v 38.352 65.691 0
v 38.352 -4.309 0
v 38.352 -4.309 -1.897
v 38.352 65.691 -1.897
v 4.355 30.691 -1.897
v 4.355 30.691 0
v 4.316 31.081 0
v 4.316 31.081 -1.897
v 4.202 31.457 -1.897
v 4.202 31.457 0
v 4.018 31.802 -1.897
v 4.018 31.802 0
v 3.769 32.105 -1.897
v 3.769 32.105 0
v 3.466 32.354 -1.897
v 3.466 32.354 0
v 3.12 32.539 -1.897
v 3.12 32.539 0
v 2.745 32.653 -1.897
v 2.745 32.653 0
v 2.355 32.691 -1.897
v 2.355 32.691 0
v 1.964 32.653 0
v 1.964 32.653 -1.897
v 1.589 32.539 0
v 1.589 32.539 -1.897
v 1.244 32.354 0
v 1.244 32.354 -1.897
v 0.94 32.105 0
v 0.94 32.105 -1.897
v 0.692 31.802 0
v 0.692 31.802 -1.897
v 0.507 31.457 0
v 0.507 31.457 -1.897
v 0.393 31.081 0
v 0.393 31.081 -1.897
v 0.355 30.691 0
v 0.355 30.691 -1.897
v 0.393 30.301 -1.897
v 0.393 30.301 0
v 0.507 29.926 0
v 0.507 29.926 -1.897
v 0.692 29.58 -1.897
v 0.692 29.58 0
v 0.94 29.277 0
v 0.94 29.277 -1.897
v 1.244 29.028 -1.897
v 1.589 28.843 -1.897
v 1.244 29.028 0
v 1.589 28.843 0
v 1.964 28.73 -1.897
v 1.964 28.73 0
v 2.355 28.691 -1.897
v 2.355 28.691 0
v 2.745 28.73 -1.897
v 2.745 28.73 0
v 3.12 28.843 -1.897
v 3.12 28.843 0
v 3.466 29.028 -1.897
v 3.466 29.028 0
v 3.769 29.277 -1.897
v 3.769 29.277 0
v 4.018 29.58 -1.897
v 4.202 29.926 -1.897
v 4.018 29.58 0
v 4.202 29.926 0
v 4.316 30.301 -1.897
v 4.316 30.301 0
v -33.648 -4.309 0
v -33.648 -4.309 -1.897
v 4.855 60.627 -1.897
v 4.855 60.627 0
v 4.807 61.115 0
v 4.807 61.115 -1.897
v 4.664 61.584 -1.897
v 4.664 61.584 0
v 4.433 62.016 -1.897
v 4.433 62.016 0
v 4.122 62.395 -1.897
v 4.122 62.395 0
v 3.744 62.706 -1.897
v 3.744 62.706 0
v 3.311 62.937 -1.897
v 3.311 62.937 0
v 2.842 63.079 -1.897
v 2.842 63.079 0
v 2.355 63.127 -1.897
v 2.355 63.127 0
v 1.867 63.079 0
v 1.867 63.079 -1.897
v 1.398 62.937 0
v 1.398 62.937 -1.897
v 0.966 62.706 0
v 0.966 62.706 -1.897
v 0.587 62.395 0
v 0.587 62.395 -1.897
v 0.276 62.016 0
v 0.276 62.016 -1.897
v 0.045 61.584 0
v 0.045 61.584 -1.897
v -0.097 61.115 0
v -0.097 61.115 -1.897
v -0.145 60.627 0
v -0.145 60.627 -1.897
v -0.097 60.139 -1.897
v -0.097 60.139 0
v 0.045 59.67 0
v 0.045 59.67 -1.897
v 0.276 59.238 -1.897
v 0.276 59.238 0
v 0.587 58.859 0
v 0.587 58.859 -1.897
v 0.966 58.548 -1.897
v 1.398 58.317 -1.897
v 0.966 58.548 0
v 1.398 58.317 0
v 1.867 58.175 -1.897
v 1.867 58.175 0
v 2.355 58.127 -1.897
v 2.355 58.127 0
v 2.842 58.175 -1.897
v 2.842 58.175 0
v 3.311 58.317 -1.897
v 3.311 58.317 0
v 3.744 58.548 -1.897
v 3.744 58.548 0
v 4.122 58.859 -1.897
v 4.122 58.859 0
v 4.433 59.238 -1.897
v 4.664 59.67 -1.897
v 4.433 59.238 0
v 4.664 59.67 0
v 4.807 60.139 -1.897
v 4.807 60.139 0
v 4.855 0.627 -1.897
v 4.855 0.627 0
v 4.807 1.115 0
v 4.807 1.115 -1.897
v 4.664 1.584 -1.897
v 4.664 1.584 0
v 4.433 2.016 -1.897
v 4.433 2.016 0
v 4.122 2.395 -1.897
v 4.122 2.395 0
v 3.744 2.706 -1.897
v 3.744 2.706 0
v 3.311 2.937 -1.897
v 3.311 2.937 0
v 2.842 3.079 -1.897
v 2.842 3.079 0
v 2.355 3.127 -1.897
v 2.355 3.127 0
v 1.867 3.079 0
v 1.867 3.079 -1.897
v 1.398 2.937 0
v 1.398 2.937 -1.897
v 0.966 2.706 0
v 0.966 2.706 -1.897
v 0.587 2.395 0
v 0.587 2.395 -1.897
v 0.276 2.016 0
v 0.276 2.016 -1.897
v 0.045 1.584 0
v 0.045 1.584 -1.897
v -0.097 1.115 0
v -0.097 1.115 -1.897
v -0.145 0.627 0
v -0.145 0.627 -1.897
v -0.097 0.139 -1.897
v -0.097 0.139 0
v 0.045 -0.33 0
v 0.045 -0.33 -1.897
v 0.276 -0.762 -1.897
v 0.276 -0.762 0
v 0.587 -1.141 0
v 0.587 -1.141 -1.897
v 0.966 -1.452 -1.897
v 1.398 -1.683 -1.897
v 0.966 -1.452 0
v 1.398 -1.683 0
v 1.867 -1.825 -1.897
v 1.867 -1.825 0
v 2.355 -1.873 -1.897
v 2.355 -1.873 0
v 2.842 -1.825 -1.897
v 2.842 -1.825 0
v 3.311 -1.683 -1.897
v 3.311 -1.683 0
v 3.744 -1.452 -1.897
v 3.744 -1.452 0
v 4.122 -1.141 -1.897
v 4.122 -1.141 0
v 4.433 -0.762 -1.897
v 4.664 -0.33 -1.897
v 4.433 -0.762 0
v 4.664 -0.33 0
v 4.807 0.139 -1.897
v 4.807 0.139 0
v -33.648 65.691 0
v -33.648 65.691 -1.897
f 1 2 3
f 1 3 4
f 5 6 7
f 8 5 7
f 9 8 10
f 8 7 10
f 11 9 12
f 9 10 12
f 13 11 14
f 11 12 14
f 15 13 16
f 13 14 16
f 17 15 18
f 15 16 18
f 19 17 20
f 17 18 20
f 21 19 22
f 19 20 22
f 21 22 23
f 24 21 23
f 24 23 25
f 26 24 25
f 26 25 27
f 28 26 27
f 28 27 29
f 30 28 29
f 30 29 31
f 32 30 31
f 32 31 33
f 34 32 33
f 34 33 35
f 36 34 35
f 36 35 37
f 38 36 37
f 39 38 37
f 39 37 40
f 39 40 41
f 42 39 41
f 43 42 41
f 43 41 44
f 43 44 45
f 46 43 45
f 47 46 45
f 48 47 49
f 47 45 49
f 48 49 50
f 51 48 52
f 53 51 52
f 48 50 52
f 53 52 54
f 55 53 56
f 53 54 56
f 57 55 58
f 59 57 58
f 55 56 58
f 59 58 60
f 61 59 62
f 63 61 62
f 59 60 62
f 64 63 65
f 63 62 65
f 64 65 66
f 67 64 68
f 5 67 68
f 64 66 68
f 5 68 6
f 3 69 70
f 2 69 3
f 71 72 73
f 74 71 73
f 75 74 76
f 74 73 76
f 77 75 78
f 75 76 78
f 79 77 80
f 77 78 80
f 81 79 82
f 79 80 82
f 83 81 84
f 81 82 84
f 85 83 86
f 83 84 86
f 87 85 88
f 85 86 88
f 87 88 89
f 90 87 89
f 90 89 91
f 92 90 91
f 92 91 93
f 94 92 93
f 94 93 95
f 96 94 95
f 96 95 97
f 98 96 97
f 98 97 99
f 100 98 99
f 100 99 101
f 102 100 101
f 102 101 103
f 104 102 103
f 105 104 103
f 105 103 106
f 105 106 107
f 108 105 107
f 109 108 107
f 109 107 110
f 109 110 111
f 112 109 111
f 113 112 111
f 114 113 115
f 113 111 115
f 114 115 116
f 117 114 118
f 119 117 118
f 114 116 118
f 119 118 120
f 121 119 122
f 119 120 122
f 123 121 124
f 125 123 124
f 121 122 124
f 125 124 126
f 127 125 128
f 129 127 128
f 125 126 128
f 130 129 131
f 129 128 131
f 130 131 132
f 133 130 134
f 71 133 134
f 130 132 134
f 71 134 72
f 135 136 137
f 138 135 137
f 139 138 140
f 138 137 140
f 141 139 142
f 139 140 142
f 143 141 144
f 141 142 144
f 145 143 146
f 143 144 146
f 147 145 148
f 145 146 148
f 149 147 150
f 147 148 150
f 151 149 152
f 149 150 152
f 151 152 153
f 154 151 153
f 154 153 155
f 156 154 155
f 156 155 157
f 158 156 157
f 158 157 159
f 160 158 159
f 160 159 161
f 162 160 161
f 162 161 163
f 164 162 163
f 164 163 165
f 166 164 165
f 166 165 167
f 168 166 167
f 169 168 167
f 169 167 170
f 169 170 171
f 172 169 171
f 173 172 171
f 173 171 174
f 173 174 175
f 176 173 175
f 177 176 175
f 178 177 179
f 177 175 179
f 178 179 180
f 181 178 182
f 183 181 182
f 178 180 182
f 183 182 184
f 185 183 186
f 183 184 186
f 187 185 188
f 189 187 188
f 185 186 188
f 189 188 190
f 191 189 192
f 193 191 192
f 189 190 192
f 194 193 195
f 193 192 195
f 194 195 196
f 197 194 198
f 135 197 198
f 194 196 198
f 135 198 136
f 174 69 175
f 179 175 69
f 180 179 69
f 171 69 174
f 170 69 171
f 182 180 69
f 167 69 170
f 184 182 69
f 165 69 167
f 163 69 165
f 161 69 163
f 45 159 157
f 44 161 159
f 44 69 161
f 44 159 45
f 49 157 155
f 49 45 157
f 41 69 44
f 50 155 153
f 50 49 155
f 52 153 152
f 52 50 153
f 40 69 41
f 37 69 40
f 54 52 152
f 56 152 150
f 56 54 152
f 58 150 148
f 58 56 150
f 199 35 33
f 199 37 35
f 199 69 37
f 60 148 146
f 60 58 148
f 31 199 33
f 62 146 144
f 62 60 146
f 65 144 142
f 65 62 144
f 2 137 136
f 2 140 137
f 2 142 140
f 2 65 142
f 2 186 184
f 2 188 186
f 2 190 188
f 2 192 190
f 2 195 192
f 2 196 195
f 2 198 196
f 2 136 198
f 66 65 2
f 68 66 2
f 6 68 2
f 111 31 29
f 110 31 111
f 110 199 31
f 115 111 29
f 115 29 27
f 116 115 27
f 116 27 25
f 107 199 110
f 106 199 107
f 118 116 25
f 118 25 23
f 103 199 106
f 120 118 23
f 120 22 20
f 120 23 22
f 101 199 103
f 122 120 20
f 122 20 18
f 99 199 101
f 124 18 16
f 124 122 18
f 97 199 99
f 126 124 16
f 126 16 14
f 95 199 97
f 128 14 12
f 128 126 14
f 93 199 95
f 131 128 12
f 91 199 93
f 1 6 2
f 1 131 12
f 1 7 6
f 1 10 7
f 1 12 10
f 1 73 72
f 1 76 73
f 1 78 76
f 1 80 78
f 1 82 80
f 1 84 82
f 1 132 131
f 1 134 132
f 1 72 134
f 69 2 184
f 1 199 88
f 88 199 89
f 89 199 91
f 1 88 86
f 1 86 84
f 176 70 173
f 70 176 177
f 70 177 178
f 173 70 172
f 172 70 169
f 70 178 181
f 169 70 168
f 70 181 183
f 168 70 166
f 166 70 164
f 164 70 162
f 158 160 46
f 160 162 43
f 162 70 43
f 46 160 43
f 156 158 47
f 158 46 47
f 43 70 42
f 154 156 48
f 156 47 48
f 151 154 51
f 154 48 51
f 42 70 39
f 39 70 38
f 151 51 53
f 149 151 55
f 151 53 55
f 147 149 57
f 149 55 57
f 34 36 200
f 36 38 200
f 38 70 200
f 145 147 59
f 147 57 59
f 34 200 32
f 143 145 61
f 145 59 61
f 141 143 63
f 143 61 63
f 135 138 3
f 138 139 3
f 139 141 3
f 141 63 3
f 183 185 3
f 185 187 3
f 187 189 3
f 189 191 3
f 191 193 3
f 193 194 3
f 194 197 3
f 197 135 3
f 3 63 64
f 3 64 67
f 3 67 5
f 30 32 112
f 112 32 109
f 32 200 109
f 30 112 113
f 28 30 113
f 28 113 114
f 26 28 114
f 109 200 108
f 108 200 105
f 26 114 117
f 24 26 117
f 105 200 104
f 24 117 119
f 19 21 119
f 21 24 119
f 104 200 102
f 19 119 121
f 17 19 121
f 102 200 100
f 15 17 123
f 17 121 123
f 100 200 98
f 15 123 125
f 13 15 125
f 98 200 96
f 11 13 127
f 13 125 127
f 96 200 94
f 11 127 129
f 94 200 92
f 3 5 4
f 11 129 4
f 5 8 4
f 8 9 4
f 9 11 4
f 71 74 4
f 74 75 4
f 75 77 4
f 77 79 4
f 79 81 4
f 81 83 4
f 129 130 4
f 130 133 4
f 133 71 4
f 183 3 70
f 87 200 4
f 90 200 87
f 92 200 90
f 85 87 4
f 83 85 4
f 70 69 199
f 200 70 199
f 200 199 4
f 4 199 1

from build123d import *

# Parameters (mm, degrees)
SKETCH1_W          = 72
SKETCH1_H          = 70
BASE_FLANGE1_DEPTH = 1.89738
SKETCH6_R          = 2.5
SKETCH6_R_2        = 2
CUT_EXTRUDE1_DEPTH = 2


# Sheet-metal steps are written as plain solids
with BuildPart() as part:
    # Sketch1 → Base-Flange1 (new body)
    with BuildSketch(Plane.XY):
        with Locations((2.352272727, 30.691243667)):
            Rectangle(SKETCH1_W, SKETCH1_H)
    extrude(amount=-BASE_FLANGE1_DEPTH)

    # Sketch6 → Cut-Extrude1 (cut)
    with BuildSketch(Plane.XY):
        with Locations((2.354647746, 60.626948244)):
            Circle(SKETCH6_R)
        with Locations((2.354647746, 0.626948244)):
            Circle(SKETCH6_R)
        with Locations((2.354647746, 30.691243667)):
            Circle(SKETCH6_R_2)
    extrude(amount=-CUT_EXTRUDE1_DEPTH, mode=Mode.SUBTRACT)


solid = part.part
